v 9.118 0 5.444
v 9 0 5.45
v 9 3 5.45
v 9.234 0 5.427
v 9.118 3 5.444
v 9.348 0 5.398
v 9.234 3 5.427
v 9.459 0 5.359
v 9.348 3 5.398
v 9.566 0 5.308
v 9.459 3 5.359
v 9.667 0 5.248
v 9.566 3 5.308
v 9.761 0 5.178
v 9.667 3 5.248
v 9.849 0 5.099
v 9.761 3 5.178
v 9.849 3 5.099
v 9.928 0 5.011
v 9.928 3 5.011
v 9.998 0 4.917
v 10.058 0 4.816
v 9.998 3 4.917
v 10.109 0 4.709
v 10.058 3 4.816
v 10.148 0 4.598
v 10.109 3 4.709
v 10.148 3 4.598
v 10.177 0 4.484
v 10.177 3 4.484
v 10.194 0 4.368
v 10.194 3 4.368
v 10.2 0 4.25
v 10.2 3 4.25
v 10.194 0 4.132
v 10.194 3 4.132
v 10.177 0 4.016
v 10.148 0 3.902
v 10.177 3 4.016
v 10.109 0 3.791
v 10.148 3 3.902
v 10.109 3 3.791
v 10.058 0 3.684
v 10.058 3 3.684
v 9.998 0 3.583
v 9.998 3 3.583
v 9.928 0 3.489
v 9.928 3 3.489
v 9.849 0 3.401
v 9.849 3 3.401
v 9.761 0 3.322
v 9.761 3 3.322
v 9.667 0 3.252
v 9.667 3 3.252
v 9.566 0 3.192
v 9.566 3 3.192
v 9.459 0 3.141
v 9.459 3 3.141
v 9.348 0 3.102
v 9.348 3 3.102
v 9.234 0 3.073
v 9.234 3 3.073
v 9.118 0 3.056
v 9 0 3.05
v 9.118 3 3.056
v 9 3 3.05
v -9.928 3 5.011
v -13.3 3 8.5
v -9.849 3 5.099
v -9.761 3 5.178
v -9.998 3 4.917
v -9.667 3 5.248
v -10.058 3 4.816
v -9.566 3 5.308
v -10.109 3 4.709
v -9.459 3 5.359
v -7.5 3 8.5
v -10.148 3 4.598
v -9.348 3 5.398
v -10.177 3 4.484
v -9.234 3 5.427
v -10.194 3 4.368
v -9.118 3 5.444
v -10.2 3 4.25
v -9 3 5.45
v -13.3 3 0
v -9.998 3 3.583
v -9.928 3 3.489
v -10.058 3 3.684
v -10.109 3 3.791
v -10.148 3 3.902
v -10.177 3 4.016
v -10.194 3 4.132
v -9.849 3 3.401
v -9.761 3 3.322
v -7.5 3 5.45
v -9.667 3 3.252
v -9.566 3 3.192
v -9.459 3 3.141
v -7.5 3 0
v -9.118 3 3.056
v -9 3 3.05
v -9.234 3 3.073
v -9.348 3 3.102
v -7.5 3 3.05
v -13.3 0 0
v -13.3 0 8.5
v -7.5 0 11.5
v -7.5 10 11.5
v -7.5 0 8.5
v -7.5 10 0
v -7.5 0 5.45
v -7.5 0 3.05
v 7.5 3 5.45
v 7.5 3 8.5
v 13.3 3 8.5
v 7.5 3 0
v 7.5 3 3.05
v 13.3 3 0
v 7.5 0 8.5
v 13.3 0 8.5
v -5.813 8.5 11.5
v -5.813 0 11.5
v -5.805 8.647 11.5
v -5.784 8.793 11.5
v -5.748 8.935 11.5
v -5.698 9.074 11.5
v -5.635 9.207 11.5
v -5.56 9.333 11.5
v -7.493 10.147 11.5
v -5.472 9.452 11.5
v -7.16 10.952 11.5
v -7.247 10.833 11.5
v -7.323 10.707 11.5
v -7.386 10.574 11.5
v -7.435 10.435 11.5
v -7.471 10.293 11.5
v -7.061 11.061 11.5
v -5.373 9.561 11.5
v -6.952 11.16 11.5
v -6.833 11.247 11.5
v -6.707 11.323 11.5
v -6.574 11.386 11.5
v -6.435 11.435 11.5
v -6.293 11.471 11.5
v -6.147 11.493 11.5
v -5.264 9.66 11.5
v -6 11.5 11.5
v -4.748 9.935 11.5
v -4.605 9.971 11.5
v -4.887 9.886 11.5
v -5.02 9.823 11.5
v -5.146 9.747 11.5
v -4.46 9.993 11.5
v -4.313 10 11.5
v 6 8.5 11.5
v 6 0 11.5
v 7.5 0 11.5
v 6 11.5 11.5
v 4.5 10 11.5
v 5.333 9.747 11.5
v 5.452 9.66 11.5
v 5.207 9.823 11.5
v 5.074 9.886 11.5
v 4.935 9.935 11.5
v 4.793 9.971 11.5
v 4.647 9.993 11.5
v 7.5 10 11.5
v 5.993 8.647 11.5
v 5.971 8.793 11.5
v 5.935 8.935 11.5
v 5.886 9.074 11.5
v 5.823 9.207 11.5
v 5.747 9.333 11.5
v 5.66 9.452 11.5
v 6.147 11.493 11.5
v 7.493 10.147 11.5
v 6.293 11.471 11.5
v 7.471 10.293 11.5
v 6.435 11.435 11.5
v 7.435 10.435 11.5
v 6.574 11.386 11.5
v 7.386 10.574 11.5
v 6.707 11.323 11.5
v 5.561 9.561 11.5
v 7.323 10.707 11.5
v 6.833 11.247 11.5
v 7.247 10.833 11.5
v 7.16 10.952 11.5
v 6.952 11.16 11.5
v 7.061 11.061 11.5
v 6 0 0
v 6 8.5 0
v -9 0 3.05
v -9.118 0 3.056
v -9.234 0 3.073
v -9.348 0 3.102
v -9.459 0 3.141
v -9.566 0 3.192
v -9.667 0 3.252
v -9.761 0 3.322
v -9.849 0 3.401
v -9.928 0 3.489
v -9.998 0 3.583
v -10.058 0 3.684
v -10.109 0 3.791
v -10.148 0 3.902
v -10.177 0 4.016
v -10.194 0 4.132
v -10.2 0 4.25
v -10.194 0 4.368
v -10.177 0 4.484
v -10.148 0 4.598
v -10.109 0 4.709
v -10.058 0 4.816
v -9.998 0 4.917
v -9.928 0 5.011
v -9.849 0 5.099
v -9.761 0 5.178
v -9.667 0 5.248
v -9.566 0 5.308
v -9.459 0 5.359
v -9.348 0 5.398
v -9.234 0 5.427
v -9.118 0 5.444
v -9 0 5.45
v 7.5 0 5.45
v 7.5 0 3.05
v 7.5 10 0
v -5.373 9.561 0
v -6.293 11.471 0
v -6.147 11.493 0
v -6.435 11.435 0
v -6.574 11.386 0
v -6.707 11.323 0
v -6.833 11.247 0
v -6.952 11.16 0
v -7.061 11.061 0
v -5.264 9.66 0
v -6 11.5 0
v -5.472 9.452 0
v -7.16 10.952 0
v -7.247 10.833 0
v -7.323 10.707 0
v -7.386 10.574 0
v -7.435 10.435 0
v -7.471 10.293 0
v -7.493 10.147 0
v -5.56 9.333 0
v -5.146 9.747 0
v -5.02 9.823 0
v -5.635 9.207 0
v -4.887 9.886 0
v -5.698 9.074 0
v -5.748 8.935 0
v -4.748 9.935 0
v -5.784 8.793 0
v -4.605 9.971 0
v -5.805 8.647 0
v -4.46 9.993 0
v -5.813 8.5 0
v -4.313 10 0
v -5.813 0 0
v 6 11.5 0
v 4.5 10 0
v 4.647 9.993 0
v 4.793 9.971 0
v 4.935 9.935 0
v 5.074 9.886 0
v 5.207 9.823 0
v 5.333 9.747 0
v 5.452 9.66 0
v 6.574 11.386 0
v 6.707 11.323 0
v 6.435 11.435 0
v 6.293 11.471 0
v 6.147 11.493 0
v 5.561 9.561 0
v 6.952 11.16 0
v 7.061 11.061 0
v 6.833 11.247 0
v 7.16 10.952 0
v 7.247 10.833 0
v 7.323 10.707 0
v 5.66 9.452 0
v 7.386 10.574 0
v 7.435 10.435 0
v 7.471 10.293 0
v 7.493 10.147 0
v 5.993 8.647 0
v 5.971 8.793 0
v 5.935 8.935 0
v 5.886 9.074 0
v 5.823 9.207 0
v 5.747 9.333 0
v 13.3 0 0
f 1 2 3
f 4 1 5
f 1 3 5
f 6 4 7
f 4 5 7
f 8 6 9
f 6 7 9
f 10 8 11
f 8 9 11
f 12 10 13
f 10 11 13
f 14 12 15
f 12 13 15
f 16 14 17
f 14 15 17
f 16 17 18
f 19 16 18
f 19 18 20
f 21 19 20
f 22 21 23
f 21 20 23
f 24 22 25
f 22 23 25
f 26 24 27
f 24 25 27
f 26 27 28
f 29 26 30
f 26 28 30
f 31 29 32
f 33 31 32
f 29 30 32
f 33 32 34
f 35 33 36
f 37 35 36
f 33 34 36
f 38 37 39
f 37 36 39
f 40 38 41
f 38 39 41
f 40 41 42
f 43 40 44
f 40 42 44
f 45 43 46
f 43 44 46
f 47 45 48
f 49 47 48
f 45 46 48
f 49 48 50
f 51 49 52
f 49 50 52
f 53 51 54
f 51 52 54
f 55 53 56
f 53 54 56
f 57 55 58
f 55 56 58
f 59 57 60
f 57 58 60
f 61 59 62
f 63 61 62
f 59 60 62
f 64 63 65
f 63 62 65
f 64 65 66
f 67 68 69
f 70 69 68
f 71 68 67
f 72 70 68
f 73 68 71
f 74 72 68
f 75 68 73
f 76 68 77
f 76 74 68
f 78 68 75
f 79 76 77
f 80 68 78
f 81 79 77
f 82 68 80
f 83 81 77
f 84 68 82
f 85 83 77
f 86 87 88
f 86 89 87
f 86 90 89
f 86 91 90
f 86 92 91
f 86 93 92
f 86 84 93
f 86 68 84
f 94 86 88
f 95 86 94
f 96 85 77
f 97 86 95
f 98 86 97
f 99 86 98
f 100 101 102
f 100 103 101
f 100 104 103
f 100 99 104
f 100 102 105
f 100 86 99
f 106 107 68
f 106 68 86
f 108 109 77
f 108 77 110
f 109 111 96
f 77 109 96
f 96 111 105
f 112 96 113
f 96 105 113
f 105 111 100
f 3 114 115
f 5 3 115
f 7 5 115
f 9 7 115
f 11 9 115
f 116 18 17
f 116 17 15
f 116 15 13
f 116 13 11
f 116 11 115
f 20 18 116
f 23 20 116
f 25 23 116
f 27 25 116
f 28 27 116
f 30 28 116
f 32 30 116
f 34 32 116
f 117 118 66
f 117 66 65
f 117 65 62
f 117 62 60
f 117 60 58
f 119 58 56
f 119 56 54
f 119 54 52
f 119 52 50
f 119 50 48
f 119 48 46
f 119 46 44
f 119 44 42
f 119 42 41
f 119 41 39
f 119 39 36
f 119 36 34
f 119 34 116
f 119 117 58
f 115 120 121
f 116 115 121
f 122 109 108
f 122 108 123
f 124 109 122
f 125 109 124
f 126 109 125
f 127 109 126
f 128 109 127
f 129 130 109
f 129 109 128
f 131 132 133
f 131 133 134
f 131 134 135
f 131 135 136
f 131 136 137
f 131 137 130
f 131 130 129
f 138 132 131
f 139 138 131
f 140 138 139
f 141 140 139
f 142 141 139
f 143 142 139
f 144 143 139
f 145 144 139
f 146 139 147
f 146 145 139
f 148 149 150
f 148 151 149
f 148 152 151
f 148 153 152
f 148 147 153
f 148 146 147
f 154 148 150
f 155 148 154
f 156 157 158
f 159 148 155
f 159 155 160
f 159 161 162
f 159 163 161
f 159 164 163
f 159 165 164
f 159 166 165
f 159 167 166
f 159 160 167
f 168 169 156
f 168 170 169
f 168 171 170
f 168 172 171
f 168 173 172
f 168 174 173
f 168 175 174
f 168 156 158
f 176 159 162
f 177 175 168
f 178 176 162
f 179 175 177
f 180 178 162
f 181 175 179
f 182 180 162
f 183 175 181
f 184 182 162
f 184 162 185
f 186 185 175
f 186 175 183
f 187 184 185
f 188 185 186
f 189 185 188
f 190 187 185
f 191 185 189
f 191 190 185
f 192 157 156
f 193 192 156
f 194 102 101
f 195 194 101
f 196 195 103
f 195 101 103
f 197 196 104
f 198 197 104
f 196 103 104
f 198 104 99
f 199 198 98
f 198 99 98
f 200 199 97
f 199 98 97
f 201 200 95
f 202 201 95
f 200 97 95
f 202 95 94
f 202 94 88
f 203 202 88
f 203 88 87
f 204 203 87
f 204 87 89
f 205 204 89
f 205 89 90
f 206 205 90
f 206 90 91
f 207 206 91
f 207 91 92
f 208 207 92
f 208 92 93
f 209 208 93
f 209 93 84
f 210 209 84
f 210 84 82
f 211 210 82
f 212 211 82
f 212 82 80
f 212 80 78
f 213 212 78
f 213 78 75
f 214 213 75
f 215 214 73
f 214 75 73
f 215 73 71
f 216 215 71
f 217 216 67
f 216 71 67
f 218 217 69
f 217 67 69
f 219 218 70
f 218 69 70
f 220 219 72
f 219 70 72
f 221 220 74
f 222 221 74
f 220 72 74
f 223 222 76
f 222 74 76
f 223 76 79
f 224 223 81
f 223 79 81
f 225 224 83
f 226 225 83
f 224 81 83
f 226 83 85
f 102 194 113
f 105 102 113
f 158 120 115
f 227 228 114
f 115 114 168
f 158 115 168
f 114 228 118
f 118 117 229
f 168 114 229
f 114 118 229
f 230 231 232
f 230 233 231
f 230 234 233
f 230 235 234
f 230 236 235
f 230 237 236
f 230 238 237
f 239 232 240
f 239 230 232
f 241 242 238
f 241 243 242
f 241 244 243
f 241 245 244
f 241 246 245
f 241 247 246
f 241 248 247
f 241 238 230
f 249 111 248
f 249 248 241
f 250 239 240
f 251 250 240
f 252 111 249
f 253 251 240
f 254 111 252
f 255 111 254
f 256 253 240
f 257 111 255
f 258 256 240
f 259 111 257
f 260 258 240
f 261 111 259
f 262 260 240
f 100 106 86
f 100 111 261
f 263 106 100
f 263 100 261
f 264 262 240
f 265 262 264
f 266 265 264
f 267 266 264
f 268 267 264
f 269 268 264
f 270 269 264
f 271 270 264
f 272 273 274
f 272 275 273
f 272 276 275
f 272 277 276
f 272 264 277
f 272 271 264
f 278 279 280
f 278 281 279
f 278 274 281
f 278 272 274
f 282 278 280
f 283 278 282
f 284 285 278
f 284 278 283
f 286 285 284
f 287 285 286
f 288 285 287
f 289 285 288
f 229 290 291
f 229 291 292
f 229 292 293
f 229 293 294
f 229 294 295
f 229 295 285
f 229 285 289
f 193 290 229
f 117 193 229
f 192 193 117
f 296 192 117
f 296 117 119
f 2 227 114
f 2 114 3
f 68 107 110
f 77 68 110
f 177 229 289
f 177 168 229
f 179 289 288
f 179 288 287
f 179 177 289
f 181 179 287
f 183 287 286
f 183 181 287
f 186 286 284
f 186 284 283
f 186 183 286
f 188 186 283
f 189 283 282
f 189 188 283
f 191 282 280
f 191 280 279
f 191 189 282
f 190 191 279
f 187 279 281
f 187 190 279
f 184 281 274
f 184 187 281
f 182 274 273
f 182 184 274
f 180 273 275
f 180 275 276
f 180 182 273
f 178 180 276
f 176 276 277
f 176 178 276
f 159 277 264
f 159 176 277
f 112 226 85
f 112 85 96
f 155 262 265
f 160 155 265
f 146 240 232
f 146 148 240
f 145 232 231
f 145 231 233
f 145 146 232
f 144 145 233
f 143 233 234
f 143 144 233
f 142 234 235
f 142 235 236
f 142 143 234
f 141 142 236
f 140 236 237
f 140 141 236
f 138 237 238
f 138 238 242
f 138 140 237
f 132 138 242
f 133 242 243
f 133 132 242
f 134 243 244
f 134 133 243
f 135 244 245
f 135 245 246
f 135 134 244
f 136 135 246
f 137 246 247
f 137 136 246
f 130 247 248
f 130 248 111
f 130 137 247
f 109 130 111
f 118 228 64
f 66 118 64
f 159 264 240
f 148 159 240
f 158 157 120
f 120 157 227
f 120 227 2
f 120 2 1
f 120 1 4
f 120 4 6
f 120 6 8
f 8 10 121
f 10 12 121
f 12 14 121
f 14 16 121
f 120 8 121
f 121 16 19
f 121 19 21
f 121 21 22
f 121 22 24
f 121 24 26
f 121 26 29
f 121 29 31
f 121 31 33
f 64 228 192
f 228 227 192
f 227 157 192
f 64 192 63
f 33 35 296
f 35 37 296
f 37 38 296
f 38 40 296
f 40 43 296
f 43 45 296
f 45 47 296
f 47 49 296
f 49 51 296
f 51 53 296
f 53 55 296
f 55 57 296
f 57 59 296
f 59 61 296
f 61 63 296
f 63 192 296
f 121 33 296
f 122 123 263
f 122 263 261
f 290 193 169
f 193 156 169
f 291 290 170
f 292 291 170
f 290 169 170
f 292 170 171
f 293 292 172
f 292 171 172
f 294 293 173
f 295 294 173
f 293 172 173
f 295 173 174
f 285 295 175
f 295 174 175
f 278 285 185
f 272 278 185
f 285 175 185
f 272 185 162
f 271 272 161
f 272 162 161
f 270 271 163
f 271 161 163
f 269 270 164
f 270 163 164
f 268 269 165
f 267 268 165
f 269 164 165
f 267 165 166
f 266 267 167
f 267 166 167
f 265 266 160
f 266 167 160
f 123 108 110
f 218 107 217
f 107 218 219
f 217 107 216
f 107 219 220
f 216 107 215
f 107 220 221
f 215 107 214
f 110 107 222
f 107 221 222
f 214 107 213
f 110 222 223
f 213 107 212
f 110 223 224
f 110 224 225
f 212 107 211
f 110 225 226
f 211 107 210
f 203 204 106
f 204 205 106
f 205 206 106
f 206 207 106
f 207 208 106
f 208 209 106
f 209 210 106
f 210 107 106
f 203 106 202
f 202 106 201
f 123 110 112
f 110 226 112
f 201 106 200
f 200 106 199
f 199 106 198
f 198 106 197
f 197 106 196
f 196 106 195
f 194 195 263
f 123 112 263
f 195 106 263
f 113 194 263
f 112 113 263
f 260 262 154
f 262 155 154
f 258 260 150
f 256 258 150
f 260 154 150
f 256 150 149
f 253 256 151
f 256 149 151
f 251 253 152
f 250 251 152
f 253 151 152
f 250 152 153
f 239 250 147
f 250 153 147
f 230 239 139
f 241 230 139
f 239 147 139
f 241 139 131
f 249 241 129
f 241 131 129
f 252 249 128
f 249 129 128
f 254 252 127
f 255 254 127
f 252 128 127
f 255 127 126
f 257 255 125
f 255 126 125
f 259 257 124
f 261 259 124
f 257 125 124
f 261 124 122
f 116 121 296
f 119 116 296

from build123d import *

# Parameters (mm, degrees)
EXTRUDE_1_DEPTH     = 11.5
SKETCH_3_W          = 11.812534662
SKETCH_3_H          = 10
CUT_EXTRUDE_1_DEPTH = 11.5
FILLET_1_R          = 1.5
FILLET_2_R          = 1.5
FILLET_3_R          = 1.5
FILLET_4_R          = 1.5
SKETCH_5_W          = 5.8
SKETCH_5_H          = 8.5
EXTRUDE_2_DEPTH     = 3
HOLE_WIZARD_M2_1_D  = 2.4
SKETCH_9_W          = 1.5
SKETCH_9_H          = 2.4
CUT_EXTRUDE_4_DEPTH = 3


with BuildPart() as part:
    # ｽｹｯﾁ1 → ﾎﾞｽ - 押し出し1 (new body)
    with BuildSketch(Plane.XY):
        Polygon((0, 0), (7.5, 0), (7.5, 11.5), (-7.5, 11.5), (-7.5, 0), align=None)
    extrude(amount=EXTRUDE_1_DEPTH)

    # ｽｹｯﾁ3 → ｶｯﾄ - 押し出し1 (cut)
    with BuildSketch(Plane.XY):
        with Locations((0.093732669, 5)):
            Rectangle(SKETCH_3_W, SKETCH_3_H)
    extrude(amount=CUT_EXTRUDE_1_DEPTH, mode=Mode.SUBTRACT)

    # ﾌｨﾚｯﾄ1
    fillet_1_edges = [part.edges().sort_by_distance(p)[0] for p in [
        (6, 10, 5.75),
    ]]
    fillet(fillet_1_edges, radius=FILLET_1_R)

    # ﾌｨﾚｯﾄ2
    fillet_2_edges = [part.edges().sort_by_distance(p)[0] for p in [
        (-5.812534662, 10, 5.75),
    ]]
    fillet(fillet_2_edges, radius=FILLET_2_R)

    # ﾌｨﾚｯﾄ3
    fillet_3_edges = [part.edges().sort_by_distance(p)[0] for p in [
        (7.5, 11.5, 5.75),
    ]]
    fillet(fillet_3_edges, radius=FILLET_3_R)

    # ﾌｨﾚｯﾄ4
    fillet_4_edges = [part.edges().sort_by_distance(p)[0] for p in [
        (-7.5, 11.5, 5.75),
    ]]
    fillet(fillet_4_edges, radius=FILLET_4_R)

    # ｽｹｯﾁ5 → ﾎﾞｽ - 押し出し2 (add)
    with BuildSketch(Plane(origin=(0, 0, 0), x_dir=(1, 0, 0), z_dir=(0, 1, 0))):
        with Locations((-10.4, -4.25)):
            Rectangle(SKETCH_5_W, SKETCH_5_H)
        with Locations((10.4, -4.25)):
            Rectangle(SKETCH_5_W, SKETCH_5_H)
    extrude(amount=EXTRUDE_2_DEPTH)

    # M2 すきま穴1 (through all)
    with Locations(Plane(origin=(0, 0, 0), x_dir=(-1, 0, 0), z_dir=(0, -1, 0))):
        with Locations((9, -4.25), (-9, -4.25)):
            Hole(HOLE_WIZARD_M2_1_D / 2)

    # ｽｹｯﾁ9 → ｶｯﾄ - 押し出し4 (cut)
    with BuildSketch(Plane(origin=(0, 0, 0), x_dir=(1, 0, 0), z_dir=(0, 1, 0))):
        with Locations((8.25, -4.25)):
            Rectangle(SKETCH_9_W, SKETCH_9_H)
        with Locations((-8.25, -4.25)):
            Rectangle(SKETCH_9_W, SKETCH_9_H)
    extrude(amount=CUT_EXTRUDE_4_DEPTH, mode=Mode.SUBTRACT)


solid = part.part
